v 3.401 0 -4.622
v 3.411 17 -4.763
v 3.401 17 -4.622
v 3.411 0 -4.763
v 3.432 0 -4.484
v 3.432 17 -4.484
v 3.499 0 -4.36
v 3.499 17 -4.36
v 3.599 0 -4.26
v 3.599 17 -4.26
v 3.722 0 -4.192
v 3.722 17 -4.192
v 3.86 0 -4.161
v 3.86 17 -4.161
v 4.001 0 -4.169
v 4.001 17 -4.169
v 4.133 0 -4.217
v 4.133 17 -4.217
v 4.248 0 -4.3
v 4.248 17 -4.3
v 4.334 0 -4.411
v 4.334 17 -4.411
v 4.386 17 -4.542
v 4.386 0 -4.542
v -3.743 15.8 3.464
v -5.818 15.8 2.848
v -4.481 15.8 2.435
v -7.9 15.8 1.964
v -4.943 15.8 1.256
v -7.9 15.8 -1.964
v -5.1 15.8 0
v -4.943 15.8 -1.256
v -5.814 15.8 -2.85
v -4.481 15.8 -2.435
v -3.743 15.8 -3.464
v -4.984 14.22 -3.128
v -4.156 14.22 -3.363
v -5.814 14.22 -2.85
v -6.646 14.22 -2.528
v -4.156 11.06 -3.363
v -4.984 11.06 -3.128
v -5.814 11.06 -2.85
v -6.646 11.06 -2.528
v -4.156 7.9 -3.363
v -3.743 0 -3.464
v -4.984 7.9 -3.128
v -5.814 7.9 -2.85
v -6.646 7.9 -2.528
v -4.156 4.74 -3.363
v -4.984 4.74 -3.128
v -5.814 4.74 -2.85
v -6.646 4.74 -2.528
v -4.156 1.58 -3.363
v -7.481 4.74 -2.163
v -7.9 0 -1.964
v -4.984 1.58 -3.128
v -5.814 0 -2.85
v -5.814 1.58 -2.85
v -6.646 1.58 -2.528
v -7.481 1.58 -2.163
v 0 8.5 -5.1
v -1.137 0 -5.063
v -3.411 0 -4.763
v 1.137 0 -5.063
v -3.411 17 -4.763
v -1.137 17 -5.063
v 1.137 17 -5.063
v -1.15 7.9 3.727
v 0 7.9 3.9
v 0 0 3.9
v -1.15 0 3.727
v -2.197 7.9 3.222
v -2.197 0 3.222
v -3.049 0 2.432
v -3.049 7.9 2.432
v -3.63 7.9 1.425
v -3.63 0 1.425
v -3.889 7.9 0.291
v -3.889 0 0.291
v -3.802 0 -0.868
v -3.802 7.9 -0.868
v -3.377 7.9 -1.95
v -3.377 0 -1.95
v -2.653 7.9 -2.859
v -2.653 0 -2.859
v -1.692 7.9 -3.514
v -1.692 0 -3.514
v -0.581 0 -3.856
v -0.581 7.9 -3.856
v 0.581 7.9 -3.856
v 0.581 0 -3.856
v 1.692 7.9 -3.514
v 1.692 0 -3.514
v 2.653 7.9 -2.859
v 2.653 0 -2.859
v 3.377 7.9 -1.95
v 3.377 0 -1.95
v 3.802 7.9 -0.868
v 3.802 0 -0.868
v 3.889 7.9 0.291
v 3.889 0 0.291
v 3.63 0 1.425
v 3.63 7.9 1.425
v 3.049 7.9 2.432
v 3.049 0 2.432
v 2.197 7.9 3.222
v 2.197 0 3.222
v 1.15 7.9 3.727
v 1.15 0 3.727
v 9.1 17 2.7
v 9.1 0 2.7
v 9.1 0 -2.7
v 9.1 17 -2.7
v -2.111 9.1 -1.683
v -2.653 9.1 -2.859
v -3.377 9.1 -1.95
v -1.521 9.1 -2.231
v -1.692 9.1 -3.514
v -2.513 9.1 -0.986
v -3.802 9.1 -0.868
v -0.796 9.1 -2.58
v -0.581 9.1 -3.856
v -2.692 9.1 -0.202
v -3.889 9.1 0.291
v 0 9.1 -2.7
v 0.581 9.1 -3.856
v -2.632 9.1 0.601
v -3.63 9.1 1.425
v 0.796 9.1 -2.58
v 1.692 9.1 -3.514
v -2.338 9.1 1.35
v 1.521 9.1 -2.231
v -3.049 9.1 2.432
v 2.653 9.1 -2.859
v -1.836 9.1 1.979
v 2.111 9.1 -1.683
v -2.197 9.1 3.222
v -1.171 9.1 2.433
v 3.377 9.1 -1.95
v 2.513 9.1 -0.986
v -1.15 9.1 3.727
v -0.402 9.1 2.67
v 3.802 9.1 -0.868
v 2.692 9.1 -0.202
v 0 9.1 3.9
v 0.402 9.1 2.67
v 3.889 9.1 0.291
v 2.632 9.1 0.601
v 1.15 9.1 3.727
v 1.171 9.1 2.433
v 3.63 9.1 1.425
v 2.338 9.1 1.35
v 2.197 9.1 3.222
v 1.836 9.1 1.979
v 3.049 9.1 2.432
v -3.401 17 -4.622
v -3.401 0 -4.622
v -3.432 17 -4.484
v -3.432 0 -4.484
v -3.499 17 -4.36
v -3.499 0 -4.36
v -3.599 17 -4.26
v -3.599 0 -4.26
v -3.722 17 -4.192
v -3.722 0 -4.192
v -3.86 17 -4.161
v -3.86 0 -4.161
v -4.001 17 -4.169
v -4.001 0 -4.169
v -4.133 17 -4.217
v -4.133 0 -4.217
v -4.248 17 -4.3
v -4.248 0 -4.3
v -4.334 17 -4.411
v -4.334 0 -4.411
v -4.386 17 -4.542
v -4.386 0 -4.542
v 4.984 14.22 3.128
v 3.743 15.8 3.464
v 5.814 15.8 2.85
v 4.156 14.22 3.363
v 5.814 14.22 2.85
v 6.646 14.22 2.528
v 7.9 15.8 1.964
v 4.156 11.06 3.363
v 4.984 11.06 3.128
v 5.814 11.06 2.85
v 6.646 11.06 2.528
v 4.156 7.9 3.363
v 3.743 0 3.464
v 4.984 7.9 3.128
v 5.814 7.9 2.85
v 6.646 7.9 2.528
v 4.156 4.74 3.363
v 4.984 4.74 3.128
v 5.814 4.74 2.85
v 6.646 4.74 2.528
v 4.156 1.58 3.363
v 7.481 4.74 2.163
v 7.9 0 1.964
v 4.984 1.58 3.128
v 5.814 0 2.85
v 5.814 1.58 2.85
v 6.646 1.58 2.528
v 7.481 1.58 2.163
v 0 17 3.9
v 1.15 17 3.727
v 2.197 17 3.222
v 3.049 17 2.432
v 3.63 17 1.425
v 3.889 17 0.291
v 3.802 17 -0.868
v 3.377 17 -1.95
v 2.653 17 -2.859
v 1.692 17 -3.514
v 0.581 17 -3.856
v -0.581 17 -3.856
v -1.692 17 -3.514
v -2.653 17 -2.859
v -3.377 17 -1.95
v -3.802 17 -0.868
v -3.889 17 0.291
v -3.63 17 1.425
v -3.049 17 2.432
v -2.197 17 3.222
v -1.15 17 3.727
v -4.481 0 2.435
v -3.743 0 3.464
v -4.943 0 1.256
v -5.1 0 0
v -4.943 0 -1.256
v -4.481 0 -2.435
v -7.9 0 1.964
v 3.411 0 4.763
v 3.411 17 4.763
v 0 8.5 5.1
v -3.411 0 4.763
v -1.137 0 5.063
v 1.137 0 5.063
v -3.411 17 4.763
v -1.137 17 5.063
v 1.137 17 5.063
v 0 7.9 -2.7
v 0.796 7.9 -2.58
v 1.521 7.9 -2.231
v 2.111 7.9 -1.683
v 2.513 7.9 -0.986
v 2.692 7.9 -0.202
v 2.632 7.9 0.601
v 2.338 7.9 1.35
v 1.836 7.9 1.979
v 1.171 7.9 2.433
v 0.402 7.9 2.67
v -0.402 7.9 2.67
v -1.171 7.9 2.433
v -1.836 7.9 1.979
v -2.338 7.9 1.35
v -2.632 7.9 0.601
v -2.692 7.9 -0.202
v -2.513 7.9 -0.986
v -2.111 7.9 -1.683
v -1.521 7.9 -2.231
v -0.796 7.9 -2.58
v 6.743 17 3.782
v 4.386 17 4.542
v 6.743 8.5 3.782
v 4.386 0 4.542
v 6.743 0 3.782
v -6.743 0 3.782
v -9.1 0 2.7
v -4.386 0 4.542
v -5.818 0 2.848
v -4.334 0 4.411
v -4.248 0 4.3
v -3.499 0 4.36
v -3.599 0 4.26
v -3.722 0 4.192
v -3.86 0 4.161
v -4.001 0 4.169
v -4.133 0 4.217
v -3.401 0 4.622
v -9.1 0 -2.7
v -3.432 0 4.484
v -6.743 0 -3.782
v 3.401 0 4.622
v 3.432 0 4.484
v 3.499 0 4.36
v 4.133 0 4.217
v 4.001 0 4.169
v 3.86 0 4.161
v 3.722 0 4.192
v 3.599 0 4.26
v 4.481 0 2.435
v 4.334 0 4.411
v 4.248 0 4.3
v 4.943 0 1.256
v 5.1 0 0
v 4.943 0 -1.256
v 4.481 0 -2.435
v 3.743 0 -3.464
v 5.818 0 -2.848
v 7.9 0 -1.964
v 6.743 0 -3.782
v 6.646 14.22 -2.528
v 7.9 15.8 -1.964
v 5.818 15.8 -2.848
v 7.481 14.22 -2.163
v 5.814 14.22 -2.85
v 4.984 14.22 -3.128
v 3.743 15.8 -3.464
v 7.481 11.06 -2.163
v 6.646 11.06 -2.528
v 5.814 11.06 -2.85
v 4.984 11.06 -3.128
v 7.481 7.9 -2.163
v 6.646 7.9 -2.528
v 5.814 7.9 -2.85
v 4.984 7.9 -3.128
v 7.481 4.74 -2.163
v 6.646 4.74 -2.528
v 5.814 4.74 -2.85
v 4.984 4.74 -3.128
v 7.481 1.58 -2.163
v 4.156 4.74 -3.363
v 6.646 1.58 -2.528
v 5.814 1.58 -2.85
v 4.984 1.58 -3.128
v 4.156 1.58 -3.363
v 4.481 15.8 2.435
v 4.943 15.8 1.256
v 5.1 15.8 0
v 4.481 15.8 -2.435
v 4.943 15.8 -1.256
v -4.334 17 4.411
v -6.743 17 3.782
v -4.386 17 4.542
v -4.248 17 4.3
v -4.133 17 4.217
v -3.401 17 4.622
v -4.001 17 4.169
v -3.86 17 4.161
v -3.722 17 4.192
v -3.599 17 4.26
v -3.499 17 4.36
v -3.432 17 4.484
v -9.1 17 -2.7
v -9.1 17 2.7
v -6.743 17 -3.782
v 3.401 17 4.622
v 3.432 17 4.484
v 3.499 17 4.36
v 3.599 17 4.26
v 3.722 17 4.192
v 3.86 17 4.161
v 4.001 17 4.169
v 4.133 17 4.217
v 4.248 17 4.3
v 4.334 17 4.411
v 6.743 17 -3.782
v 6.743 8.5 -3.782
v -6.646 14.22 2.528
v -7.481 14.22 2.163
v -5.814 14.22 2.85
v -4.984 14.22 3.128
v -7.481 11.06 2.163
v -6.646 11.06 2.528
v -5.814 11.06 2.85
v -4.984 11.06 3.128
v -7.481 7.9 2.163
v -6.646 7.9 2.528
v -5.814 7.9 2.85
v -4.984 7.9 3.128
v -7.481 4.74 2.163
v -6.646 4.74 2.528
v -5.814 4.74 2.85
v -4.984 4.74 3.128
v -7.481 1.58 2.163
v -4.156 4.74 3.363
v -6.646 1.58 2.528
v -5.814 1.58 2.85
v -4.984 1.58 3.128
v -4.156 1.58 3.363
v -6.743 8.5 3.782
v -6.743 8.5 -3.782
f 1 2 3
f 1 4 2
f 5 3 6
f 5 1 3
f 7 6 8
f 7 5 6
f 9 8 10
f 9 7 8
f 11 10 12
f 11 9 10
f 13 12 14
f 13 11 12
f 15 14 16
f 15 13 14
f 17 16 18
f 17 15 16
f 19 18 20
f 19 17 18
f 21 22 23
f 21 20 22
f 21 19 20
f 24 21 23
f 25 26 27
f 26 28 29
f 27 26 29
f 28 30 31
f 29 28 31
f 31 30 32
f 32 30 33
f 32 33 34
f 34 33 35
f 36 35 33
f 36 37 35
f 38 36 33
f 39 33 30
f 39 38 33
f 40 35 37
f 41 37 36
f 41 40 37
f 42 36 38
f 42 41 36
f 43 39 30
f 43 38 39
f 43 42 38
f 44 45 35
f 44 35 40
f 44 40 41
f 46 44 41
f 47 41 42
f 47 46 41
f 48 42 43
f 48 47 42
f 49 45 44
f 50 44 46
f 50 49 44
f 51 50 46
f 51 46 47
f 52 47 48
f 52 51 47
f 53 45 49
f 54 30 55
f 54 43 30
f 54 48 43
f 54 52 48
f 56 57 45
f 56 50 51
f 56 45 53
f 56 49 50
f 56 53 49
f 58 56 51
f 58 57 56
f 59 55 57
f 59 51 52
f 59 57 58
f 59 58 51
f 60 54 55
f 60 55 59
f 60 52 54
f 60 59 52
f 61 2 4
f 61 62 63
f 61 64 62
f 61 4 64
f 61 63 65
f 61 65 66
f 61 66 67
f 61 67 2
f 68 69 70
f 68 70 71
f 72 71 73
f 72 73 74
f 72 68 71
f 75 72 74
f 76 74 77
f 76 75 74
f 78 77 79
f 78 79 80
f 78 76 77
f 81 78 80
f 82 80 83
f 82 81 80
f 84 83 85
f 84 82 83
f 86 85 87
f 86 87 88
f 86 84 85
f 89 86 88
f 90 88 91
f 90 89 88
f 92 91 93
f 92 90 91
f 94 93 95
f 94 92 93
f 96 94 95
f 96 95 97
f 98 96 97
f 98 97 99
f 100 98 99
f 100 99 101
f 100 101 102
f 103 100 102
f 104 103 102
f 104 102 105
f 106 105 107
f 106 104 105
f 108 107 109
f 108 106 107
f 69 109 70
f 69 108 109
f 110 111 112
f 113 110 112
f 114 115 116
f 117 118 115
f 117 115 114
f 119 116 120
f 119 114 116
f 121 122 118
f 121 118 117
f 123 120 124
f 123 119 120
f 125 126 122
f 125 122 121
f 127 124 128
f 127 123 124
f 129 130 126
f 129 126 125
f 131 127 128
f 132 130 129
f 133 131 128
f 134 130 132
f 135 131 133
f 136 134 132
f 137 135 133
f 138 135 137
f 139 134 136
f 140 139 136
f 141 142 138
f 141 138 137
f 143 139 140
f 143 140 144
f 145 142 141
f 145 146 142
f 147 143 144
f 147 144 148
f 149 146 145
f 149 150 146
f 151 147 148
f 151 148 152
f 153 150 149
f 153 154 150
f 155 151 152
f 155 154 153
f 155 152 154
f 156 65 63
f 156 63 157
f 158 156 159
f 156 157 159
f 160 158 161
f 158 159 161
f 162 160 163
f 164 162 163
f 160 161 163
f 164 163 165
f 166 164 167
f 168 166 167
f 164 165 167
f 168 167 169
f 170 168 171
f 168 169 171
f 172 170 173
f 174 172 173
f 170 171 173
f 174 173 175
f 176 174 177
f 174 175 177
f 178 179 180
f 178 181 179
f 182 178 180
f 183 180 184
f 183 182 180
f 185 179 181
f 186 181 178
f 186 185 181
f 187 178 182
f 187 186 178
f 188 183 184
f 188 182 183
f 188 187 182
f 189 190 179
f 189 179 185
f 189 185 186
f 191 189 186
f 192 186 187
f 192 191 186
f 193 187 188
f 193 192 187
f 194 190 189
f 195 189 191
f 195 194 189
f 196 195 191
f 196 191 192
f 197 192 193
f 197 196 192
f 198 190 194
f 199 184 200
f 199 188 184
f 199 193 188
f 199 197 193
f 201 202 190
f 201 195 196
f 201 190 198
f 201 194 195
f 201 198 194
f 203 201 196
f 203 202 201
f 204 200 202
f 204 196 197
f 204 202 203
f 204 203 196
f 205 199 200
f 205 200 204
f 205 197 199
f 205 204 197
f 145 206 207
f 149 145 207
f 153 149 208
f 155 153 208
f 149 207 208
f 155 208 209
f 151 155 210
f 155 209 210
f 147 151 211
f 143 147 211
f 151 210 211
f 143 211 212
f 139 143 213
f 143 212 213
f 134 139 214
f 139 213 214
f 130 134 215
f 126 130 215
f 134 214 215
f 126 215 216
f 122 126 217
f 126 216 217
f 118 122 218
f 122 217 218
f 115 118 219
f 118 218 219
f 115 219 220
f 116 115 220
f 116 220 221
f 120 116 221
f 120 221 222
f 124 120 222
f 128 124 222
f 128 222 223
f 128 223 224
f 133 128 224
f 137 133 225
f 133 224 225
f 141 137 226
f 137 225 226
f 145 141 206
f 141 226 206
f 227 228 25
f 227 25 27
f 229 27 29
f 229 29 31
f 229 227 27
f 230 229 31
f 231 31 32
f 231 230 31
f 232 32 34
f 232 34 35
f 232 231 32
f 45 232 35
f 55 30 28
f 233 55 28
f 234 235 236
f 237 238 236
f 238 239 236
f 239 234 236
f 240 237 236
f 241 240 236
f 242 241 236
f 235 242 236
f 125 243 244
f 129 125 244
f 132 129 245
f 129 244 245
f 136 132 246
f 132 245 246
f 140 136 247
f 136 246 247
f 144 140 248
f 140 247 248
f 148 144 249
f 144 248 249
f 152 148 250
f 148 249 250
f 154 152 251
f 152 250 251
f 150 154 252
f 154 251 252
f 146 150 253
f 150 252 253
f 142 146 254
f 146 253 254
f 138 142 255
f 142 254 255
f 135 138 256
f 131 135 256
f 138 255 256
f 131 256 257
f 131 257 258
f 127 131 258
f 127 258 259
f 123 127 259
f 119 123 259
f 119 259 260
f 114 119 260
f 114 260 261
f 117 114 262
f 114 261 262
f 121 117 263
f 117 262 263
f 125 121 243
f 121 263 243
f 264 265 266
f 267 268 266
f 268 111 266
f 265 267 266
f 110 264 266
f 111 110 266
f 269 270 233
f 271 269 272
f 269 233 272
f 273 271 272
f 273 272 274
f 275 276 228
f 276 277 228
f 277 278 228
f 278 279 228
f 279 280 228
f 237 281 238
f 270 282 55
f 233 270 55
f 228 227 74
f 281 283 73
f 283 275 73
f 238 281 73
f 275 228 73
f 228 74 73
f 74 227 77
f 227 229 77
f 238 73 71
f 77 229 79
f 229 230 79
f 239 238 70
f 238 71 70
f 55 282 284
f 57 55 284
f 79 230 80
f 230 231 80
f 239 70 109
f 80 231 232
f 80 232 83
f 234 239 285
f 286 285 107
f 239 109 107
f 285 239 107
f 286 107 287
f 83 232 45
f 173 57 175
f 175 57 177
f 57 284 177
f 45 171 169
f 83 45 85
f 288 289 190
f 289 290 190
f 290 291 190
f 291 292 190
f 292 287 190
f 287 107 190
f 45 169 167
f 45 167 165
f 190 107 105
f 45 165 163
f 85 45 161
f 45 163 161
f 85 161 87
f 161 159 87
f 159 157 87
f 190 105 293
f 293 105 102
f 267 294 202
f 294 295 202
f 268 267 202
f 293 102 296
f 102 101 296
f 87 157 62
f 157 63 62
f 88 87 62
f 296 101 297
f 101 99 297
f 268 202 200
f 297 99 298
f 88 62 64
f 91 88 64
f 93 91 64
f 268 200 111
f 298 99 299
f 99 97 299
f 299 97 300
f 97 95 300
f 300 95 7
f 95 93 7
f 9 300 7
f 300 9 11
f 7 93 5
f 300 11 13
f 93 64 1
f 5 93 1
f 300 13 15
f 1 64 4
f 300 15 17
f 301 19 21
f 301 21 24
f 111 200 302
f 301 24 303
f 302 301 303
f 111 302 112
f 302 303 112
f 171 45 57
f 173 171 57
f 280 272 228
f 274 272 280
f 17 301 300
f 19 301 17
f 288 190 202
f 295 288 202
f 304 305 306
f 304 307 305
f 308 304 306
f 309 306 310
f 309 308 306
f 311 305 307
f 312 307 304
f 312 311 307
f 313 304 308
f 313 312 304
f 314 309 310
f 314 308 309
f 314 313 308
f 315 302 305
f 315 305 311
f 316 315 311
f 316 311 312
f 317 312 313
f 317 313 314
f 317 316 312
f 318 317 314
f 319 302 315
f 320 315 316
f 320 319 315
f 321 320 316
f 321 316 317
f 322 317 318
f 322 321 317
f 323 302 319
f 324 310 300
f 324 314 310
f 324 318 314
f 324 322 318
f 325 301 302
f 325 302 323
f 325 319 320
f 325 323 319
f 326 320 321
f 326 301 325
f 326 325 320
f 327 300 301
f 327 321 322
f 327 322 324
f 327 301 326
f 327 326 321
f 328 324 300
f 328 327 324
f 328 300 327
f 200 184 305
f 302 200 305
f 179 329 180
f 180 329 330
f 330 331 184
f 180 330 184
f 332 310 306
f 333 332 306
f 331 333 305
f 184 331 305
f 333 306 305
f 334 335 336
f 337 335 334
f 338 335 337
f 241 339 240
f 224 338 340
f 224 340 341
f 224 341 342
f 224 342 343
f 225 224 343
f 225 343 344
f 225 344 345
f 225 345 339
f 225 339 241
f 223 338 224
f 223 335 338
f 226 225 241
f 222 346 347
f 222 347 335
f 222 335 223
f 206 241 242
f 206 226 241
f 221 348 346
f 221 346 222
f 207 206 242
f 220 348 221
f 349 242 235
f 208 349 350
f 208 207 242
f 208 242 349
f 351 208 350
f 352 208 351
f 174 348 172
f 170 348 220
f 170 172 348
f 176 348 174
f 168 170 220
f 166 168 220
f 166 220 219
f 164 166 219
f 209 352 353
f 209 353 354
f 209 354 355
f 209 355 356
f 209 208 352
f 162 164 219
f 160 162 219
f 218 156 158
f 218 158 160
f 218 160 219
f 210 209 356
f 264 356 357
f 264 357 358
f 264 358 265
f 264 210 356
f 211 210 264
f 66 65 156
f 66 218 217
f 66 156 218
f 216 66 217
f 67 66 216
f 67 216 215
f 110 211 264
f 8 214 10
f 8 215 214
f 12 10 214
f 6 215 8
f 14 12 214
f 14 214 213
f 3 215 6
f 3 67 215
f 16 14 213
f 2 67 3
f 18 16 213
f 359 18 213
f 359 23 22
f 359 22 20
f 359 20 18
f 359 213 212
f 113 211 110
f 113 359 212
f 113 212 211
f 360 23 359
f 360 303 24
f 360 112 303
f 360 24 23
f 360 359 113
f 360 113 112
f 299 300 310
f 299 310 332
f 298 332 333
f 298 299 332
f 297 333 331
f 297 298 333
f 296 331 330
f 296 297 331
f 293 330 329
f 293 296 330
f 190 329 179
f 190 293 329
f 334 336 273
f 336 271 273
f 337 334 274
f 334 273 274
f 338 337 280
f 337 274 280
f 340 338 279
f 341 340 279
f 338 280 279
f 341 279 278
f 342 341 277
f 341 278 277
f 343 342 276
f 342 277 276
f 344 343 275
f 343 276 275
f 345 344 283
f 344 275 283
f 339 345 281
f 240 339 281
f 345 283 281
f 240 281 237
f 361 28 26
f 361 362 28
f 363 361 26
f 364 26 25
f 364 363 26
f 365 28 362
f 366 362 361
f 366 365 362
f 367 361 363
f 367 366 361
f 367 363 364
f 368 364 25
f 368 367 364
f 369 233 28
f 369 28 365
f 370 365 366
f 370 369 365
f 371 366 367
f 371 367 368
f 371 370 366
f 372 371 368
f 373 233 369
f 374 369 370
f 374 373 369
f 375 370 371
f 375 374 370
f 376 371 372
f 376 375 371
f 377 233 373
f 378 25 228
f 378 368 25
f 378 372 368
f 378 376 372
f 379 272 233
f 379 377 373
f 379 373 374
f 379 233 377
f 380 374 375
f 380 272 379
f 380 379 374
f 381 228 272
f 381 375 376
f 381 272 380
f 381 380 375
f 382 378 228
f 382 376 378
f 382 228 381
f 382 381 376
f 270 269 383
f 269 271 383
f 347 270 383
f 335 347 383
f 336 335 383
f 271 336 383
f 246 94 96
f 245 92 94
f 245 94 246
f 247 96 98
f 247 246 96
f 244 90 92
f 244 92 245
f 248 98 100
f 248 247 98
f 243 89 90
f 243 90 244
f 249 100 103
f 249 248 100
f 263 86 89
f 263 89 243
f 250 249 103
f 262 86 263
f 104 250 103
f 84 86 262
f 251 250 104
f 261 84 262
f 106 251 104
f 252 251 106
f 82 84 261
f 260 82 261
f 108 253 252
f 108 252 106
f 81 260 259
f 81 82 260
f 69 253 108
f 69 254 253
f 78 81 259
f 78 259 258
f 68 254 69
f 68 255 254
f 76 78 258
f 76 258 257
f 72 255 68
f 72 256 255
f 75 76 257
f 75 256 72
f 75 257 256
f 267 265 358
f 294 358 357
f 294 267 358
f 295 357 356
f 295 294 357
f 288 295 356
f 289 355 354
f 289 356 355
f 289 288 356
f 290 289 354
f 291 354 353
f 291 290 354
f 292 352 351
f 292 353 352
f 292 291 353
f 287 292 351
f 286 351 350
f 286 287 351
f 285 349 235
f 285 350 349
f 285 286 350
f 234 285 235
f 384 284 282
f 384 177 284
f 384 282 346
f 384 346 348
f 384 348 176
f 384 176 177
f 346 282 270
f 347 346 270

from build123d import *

# Parameters (mm, degrees)
BOSS_EXTRUDE1_DEPTH = 17
SKETCH2_R           = 3.9
CUT_EXTRUDE1_DEPTH  = 7.9
CUT_EXTRUDE2_START  = -7.9
SKETCH3_R           = 3.9
CUT_EXTRUDE2_DEPTH  = 7.9
SKETCH4_R           = 2.7
CUT_EXTRUDE3_DEPTH  = 1.2
SHELL1_DEPTH        = 15.8
SKETCH8_R           = 0.5
CUT_EXTRUDE4_DEPTH  = 17


# Read off the part's stored shape, not the designer's step: Shell1
with BuildPart() as part:
    # Sketch1 → Boss-Extrude1 (new body)
    with BuildSketch(Plane(origin=(0, 0, 0), x_dir=(1, 0, 0), z_dir=(0, 1, 0))):
        with BuildLine():
            Line((-9.1, 2.7), (-9.1, -2.7))
            add(Edge.make_bspline(
                [(-9.1, -2.7), (0, -7.5), (9.1, -2.7)],
                knots=[0, 0, 0, 1, 1, 1], degree=2))
            Line((9.1, -2.7), (9.1, 2.7))
            add(Edge.make_bspline(
                [(-9.1, 2.7), (0, 7.5), (9.1, 2.7)],
                knots=[0, 0, 0, 1, 1, 1], degree=2))
        make_face()
    extrude(amount=BOSS_EXTRUDE1_DEPTH)

    # Sketch2 → Cut-Extrude1 (cut)
    with BuildSketch(Plane(origin=(0, 17, 0), x_dir=(1, 0, 0), z_dir=(0, 1, 0))):
        with Locations(Location((0, 0, 0), (0, 0, 270))):
            Circle(SKETCH2_R)
    extrude(amount=-CUT_EXTRUDE1_DEPTH, mode=Mode.SUBTRACT)

    # Sketch3 → Cut-Extrude2 (cut)
    with BuildSketch(Plane(origin=(0, 0, 0), x_dir=(-1, 0, 0), z_dir=(0, -1, 0)).offset(CUT_EXTRUDE2_START)):
        with Locations(Location((0, 0, 0), (0, 0, 270))):
            Circle(SKETCH3_R)
    extrude(amount=CUT_EXTRUDE2_DEPTH, mode=Mode.SUBTRACT)

    # Sketch4 → Cut-Extrude3 (cut)
    with BuildSketch(Plane.XZ.offset(-7.9)):
        with Locations(Location((0, 0, 0), (0, 0, 270))):
            Circle(SKETCH4_R)
    extrude(amount=-CUT_EXTRUDE3_DEPTH, mode=Mode.SUBTRACT)

    # Shell1 outline → Shell1 (cut)
    with BuildSketch(Plane(origin=(0, 0, 0), x_dir=(1, 0, 0), z_dir=(0, 1, 0))):
        with BuildLine():
            Line((-7.899999781, 1.963775482), (-7.899999781, -1.963775482))
            add(Edge.make_bspline(
                [(-7.899999781, -1.963775482), (-7.481101996, -2.168383254), (-7.062952664, -2.360723495), (-6.645550136, -2.540844903), (-6.228886411, -2.708799004), (-5.812947019, -2.864639229), (-5.397710236, -3.008420202), (-4.983146308, -3.140196716), (-4.569217021, -3.260022384), (-4.155875768, -3.367948145), (-3.7430681, -3.46402079)],
                knots=[0.036996465, 0.036996465, 0.036996465, 0.036996465, 0.036996465, 0.036996465, 0.036996465, 0.036996465, 0.036996465, 0.036996465, 0.036996465, 0.279391491, 0.279391491, 0.279391491, 0.279391491, 0.279391491, 0.279391491, 0.279391491, 0.279391491, 0.279391491, 0.279391491, 0.279391491], degree=10))
            ThreePointArc((-3.7430681, -3.46402079), (-5.1, 0), (-3.74306828, 3.464020764))
            add(Edge.make_bspline(
                [(-3.74306828, 3.464020764), (-4.155875768, 3.367948145), (-4.569217021, 3.260022384), (-4.983146308, 3.140196716), (-5.397710236, 3.008420202), (-5.812947019, 2.864639229), (-6.228886411, 2.708799004), (-6.645550136, 2.540844903), (-7.062952664, 2.360723495), (-7.481101996, 2.168383254), (-7.899999781, 1.963775482)],
                knots=[0.720608509, 0.720608509, 0.720608509, 0.720608509, 0.720608509, 0.720608509, 0.720608509, 0.720608509, 0.720608509, 0.720608509, 0.720608509, 0.963003535, 0.963003535, 0.963003535, 0.963003535, 0.963003535, 0.963003535, 0.963003535, 0.963003535, 0.963003535, 0.963003535, 0.963003535], degree=10))
        make_face()
        with BuildLine():
            ThreePointArc((3.74306828, 3.464020764), (5.1, 0), (3.74306828, -3.464020764))
            add(Edge.make_bspline(
                [(3.74306828, -3.464020764), (4.155875768, -3.367948145), (4.569217021, -3.260022384), (4.983146308, -3.140196716), (5.397710236, -3.008420202), (5.812947019, -2.864639229), (6.228886411, -2.708799004), (6.645550136, -2.540844903), (7.062952664, -2.360723495), (7.481101996, -2.168383254), (7.899999781, -1.963775482)],
                knots=[0.720608509, 0.720608509, 0.720608509, 0.720608509, 0.720608509, 0.720608509, 0.720608509, 0.720608509, 0.720608509, 0.720608509, 0.720608509, 0.963003535, 0.963003535, 0.963003535, 0.963003535, 0.963003535, 0.963003535, 0.963003535, 0.963003535, 0.963003535, 0.963003535, 0.963003535], degree=10))
            Line((7.899999781, -1.963775482), (7.899999781, 1.963775482))
            add(Edge.make_bspline(
                [(7.899999781, 1.963775482), (7.481101996, 2.168383254), (7.062952664, 2.360723495), (6.645550136, 2.540844903), (6.228886411, 2.708799004), (5.812947019, 2.864639229), (5.397710236, 3.008420202), (4.983146308, 3.140196716), (4.569217021, 3.260022384), (4.155875768, 3.367948145), (3.74306828, 3.464020764)],
                knots=[0.036996465, 0.036996465, 0.036996465, 0.036996465, 0.036996465, 0.036996465, 0.036996465, 0.036996465, 0.036996465, 0.036996465, 0.036996465, 0.279391491, 0.279391491, 0.279391491, 0.279391491, 0.279391491, 0.279391491, 0.279391491, 0.279391491, 0.279391491, 0.279391491, 0.279391491], degree=10))
        make_face()
    extrude(amount=SHELL1_DEPTH, mode=Mode.SUBTRACT)

    # Sketch8 → Cut-Extrude4 (cut)
    with BuildSketch(Plane.XZ):
        with Locations((-3.9, 4.659183673)):
            Circle(SKETCH8_R)
        with Locations((-3.9, -4.659183673)):
            Circle(SKETCH8_R)
    cut_extrude4 = extrude(amount=-CUT_EXTRUDE4_DEPTH, mode=Mode.SUBTRACT)

    # Mirror1: Cut-Extrude4 across plane
    add(cut_extrude4.mirror(Plane(origin=(0, 0, 0), x_dir=(0, 0, 1), z_dir=(1, 0, 0))), mode=Mode.SUBTRACT)


solid = part.part
